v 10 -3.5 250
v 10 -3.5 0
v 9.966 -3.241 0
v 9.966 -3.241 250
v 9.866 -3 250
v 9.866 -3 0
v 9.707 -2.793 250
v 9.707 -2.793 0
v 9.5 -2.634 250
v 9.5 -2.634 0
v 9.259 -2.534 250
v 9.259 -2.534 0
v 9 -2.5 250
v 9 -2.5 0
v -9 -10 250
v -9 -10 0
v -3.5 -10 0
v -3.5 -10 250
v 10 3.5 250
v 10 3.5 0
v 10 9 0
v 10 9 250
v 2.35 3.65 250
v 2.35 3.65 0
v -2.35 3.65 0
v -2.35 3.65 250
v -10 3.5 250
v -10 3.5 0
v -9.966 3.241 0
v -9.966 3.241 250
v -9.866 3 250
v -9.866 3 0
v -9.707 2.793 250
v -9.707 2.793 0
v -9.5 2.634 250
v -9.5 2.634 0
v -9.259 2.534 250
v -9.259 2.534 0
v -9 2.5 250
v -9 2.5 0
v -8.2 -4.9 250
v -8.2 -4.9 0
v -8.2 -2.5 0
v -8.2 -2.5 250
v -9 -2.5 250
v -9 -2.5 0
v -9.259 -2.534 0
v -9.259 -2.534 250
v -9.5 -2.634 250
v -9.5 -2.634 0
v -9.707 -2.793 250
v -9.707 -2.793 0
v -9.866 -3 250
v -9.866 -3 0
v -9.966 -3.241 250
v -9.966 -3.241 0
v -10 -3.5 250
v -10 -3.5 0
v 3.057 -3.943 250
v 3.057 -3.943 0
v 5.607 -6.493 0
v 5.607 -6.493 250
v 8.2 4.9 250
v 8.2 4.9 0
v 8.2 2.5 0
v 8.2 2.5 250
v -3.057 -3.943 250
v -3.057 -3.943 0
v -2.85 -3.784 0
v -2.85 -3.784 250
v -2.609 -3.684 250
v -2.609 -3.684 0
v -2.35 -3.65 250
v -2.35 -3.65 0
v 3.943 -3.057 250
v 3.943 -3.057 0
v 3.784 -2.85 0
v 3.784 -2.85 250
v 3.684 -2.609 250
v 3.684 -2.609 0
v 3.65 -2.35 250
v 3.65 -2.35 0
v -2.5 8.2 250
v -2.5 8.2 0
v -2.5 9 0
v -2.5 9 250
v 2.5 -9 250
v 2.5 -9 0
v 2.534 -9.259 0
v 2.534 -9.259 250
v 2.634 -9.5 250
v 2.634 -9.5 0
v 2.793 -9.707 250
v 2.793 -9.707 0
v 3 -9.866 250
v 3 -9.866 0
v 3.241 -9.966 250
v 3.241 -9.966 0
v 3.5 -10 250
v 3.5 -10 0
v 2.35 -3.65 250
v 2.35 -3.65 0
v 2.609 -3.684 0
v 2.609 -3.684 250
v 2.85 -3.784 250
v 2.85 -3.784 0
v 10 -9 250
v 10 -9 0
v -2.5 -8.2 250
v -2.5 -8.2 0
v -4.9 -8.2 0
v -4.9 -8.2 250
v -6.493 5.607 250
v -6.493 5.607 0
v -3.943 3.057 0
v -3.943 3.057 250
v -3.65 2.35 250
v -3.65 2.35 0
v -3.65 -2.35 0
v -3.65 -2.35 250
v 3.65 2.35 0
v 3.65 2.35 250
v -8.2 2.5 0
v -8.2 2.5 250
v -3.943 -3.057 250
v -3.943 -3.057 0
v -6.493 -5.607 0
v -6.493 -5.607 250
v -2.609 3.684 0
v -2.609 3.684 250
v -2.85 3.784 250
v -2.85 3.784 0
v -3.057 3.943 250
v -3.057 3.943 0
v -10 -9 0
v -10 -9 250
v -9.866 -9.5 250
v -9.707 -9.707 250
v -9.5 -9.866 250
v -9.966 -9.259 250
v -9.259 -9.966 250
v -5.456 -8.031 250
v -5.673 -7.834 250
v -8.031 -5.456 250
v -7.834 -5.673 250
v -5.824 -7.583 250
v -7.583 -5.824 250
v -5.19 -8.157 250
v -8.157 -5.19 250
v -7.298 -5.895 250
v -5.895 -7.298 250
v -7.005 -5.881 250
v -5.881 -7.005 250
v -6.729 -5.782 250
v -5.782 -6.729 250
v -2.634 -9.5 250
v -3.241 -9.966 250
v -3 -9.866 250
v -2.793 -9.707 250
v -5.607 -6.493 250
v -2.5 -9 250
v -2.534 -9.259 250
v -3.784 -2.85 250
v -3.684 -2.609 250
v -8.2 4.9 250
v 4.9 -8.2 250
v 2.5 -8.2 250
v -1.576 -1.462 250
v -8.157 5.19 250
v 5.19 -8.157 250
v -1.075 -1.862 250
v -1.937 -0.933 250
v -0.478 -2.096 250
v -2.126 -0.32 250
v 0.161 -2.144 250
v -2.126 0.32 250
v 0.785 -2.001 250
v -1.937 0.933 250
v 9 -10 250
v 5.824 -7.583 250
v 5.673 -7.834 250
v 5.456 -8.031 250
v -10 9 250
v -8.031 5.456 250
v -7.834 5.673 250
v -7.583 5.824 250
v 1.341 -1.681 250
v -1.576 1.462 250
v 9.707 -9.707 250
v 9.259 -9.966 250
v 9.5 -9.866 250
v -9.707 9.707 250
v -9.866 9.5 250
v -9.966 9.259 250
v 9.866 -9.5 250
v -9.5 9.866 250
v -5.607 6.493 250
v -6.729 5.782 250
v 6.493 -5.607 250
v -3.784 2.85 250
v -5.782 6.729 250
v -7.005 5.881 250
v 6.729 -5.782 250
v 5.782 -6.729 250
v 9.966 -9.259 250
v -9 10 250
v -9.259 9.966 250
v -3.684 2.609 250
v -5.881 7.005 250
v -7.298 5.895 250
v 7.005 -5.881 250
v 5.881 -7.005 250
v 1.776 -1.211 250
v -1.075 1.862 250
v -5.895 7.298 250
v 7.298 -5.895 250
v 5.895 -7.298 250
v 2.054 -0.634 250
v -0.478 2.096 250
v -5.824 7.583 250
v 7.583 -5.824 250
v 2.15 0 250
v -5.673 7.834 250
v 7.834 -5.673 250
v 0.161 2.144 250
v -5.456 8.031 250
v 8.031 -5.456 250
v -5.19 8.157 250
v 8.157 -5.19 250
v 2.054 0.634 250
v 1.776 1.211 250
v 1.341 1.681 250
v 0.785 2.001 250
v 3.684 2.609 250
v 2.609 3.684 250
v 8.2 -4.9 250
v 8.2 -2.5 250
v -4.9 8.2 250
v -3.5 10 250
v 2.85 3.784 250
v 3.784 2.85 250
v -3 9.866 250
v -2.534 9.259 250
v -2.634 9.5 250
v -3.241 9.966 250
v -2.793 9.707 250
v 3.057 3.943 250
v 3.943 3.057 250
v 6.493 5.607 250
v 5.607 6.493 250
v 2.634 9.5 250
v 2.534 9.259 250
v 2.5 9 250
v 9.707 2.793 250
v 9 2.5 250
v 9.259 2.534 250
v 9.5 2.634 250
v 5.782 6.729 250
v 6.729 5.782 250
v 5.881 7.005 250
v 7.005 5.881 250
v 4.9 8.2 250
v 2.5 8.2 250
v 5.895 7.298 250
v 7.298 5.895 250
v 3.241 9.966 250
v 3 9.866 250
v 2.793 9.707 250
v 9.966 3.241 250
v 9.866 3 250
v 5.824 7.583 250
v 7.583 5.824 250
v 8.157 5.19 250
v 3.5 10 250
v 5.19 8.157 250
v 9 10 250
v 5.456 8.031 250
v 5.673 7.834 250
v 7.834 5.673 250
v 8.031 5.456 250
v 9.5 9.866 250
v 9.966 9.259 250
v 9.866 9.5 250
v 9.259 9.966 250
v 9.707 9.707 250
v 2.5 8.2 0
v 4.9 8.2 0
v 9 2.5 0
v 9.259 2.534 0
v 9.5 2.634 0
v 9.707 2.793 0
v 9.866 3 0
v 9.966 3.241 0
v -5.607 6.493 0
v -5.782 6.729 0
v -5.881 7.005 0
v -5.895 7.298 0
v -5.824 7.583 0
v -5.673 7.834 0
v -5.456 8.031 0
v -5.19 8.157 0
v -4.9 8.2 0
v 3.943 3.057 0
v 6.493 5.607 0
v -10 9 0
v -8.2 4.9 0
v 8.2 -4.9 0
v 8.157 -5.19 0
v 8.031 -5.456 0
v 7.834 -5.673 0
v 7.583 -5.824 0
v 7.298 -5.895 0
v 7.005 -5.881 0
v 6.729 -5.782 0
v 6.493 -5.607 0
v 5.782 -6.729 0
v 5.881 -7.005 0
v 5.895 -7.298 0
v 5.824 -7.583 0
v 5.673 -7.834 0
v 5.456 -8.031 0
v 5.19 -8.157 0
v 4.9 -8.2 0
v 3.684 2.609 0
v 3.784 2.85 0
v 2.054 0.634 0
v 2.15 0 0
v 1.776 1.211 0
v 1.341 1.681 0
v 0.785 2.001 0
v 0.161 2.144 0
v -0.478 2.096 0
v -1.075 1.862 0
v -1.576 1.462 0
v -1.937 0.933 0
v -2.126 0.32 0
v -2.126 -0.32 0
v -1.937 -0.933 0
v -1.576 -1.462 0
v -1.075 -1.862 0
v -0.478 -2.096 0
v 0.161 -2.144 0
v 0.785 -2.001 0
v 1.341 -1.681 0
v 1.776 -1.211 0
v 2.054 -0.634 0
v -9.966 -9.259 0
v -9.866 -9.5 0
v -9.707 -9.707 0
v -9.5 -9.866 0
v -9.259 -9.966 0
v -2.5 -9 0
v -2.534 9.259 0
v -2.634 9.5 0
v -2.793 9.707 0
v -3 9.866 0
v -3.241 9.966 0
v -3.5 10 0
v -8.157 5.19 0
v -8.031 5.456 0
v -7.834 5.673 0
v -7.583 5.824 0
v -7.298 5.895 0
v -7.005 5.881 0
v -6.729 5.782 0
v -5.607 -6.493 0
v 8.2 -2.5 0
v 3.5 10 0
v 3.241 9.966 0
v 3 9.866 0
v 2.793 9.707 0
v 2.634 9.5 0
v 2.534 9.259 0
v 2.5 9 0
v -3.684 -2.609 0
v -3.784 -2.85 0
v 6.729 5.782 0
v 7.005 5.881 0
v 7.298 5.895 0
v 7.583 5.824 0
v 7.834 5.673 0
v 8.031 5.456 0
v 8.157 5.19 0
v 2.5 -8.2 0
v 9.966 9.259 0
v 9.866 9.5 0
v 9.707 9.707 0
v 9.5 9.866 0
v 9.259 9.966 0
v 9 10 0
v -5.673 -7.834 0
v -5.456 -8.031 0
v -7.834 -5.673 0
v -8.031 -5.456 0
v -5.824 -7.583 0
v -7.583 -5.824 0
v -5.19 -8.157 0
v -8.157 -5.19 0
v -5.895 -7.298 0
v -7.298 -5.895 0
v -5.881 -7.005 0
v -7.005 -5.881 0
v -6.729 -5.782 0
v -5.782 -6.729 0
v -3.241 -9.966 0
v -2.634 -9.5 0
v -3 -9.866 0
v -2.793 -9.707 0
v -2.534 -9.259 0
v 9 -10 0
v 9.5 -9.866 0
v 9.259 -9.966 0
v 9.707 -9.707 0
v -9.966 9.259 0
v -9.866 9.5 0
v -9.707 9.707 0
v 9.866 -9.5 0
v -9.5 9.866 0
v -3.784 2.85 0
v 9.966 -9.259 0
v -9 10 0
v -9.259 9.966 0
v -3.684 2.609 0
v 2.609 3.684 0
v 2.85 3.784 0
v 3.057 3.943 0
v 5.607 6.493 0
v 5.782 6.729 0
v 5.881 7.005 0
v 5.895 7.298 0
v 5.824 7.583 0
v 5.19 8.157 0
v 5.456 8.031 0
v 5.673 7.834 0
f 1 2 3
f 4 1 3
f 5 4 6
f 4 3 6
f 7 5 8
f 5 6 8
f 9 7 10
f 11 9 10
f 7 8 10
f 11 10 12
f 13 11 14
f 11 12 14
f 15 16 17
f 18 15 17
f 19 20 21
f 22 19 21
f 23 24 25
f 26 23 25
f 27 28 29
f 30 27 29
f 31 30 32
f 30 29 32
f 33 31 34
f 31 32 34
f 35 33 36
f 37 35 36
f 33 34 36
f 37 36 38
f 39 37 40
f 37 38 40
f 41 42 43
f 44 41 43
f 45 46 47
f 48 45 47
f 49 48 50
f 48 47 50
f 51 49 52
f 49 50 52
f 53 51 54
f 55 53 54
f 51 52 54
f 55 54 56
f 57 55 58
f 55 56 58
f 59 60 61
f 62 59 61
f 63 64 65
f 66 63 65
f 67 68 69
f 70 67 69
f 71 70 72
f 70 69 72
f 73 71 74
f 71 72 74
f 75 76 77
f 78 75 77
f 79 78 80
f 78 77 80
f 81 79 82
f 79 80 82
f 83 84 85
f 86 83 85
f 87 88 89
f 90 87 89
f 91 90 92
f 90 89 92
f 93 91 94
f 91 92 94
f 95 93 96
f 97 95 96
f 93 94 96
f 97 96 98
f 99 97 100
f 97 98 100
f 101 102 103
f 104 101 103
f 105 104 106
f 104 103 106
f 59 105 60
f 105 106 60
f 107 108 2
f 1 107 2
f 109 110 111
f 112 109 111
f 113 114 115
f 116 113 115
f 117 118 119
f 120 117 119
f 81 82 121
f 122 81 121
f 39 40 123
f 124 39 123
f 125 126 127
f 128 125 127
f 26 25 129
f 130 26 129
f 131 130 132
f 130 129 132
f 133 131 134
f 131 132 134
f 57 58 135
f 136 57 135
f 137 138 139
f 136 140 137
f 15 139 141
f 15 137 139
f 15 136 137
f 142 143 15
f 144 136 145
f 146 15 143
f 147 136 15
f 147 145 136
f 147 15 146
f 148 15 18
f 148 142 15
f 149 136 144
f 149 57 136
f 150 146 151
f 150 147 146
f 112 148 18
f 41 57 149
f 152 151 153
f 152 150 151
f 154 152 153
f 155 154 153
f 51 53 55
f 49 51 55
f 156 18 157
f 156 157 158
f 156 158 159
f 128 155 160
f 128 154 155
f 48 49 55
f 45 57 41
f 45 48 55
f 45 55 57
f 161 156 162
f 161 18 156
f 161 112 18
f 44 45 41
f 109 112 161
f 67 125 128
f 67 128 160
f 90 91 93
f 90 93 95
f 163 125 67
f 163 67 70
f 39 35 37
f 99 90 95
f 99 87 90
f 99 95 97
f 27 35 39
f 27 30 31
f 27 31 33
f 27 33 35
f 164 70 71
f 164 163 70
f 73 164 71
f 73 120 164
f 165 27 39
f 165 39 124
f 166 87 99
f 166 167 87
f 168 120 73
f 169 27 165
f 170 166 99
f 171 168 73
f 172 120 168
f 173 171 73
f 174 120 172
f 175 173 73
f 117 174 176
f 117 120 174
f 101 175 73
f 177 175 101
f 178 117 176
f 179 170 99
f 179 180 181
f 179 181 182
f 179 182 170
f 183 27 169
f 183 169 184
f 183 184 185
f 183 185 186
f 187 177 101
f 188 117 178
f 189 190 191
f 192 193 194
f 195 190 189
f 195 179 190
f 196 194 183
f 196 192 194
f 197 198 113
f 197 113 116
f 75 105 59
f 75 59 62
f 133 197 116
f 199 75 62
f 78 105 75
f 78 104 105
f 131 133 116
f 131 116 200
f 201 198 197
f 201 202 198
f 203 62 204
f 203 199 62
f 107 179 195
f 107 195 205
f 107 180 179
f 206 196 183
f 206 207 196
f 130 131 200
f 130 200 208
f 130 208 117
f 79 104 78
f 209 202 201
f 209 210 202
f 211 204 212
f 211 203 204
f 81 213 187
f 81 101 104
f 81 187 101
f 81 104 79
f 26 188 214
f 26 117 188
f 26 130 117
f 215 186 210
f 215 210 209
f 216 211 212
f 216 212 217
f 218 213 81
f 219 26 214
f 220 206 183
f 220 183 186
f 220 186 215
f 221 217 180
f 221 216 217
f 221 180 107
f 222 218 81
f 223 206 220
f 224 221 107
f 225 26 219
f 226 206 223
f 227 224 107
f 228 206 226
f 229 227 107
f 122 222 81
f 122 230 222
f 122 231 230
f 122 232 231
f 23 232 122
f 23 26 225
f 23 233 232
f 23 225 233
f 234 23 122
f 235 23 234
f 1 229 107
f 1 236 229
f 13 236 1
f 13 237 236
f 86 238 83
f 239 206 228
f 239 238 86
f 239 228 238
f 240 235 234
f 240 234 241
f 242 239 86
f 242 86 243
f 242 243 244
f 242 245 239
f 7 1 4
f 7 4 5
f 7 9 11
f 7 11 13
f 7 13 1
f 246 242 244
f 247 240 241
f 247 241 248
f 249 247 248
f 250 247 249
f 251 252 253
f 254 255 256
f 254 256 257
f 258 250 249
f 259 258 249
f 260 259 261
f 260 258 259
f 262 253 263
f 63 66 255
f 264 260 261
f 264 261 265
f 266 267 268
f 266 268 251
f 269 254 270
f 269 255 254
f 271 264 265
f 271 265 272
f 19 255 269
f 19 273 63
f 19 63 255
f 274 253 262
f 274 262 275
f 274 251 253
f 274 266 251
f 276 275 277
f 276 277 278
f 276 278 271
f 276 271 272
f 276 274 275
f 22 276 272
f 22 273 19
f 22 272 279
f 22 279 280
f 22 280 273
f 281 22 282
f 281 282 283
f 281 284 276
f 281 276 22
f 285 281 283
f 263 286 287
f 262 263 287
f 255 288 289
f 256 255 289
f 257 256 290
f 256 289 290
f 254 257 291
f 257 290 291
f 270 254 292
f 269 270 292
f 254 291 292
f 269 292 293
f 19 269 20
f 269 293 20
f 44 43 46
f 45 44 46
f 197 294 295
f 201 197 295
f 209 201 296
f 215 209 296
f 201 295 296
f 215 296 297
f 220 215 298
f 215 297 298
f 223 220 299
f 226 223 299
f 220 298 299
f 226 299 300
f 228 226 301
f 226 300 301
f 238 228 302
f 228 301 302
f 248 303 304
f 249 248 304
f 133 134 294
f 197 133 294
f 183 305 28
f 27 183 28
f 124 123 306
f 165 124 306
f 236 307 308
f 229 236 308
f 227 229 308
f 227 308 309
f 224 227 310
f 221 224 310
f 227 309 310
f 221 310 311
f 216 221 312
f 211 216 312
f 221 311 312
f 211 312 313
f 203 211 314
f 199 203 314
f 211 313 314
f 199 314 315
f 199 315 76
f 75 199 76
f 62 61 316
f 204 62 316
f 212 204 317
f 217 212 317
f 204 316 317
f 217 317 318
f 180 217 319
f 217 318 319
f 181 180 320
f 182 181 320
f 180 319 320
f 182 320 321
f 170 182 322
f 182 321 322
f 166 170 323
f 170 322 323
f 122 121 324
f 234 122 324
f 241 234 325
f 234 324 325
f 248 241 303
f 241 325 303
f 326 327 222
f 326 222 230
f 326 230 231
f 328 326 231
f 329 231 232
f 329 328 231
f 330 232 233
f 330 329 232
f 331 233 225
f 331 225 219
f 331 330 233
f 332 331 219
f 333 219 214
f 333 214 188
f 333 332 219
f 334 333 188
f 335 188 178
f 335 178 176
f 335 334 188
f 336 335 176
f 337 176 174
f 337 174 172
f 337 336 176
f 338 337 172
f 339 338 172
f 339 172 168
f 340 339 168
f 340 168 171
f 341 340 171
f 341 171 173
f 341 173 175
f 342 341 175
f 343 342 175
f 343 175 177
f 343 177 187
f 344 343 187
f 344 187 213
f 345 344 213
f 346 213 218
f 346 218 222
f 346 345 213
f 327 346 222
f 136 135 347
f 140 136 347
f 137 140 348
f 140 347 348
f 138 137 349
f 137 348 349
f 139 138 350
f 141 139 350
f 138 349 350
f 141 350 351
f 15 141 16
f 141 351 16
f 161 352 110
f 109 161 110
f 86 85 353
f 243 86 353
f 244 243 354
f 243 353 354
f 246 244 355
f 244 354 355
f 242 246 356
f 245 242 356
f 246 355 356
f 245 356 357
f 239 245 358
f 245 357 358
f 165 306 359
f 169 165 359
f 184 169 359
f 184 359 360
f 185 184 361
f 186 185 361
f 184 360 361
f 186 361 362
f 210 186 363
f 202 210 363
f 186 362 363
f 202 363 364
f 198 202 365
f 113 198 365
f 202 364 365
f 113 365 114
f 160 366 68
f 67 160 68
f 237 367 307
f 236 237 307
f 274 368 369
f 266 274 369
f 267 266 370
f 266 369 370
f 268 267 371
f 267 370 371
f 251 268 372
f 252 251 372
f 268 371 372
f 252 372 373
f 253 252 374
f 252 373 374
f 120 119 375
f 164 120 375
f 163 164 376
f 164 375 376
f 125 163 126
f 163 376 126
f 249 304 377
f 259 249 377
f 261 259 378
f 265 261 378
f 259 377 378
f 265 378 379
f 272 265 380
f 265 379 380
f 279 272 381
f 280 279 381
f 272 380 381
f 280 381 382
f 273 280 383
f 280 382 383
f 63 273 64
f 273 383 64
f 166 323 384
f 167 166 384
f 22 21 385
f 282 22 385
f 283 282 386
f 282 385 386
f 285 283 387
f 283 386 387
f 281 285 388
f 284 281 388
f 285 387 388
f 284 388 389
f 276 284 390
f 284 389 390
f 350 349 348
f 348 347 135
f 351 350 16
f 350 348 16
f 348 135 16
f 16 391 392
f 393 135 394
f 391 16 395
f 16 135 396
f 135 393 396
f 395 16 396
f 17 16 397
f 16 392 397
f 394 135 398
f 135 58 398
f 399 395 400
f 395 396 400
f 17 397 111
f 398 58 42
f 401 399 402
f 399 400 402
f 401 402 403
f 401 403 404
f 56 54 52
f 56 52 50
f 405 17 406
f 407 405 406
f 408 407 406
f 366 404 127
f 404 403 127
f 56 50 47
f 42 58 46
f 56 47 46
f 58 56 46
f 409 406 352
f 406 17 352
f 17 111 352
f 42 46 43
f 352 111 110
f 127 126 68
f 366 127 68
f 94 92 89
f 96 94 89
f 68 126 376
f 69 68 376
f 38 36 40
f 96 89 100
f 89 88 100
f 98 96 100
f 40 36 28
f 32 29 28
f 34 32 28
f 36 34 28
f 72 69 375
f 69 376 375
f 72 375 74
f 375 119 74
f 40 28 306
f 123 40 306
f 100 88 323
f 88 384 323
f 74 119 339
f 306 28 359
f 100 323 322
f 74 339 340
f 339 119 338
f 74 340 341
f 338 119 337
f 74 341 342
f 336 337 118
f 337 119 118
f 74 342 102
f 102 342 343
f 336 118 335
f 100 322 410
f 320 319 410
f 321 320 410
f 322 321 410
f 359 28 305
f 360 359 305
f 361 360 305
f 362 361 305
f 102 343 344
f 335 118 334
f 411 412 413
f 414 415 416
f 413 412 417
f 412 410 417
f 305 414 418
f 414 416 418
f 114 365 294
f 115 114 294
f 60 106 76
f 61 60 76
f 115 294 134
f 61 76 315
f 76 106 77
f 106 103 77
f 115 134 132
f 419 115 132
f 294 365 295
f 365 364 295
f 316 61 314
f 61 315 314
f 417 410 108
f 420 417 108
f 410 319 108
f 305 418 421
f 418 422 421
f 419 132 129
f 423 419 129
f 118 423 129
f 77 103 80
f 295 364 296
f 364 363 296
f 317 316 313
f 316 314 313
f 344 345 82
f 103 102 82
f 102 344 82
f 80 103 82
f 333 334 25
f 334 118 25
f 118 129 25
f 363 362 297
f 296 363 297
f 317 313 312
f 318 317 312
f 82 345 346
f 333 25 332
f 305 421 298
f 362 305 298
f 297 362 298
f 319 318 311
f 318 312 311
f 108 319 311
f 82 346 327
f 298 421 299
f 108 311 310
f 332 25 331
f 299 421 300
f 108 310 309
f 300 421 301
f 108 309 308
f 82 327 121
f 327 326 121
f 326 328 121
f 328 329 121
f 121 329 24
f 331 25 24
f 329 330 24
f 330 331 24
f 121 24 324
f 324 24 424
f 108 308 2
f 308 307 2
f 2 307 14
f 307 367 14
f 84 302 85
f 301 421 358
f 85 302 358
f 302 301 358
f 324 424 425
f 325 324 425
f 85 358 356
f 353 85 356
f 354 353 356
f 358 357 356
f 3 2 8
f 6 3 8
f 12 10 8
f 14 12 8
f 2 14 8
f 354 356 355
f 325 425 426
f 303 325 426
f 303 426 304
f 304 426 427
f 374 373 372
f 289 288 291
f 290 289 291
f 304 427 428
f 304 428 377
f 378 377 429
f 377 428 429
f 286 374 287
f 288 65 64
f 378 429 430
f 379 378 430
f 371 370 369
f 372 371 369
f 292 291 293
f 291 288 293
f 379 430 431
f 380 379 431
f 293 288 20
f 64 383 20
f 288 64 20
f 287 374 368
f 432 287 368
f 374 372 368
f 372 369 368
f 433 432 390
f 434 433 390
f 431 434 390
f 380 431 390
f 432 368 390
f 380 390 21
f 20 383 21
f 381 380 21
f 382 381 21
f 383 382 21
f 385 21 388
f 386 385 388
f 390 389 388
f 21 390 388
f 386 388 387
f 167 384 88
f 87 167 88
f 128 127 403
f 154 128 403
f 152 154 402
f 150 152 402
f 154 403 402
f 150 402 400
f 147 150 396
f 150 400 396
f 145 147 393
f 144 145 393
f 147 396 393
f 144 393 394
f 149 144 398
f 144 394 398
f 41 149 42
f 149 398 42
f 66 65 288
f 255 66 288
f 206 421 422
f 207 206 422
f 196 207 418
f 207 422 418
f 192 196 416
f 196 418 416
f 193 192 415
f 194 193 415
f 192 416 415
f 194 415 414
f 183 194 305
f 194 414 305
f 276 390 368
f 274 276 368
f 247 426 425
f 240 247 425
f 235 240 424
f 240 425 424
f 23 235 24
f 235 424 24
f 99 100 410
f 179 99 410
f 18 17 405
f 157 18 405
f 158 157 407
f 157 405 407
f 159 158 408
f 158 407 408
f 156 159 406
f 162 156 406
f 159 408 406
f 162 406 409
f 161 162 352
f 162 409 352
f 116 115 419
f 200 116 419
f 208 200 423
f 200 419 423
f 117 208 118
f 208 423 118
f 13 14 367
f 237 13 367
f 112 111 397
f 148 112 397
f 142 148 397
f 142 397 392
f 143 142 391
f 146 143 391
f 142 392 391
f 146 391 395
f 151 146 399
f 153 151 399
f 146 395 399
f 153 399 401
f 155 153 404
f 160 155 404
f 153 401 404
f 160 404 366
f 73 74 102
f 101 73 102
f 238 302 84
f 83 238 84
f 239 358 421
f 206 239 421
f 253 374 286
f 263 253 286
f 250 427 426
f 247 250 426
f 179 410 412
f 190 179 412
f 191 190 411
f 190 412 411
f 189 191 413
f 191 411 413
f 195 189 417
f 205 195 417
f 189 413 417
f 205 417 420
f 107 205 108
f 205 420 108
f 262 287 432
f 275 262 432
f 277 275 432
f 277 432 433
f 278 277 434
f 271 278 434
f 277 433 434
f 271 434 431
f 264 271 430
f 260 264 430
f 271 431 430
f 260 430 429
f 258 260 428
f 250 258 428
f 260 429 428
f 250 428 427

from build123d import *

# Parameters (mm, degrees)
F0_R     = 2.15
F1_DEPTH = 250


# Not quite as in the source:
# - ends of sketch curves that miss each other by under 0.0002 mm in the source are joined


with BuildPart() as f1:
    # F0 (on Top) → F1 (new body)
    with BuildSketch(Plane.XY):
        with BuildLine():
            Line((10, 3.5), (10, 9))
            ThreePointArc((10, 9), (9.7071067812, 9.7071067812), (9, 10))
            Line((9, 10), (3.5, 10))
            ThreePointArc((3.5, 10), (2.7928932188, 9.7071067812), (2.5, 9))
            Line((2.5, 9), (2.5, 8.2))
            Line((2.5, 8.2), (4.9, 8.2))
            ThreePointArc((4.9, 8.2), (5.8238795325, 7.5826834324), (5.6071067812, 6.4928932188))
            Line((5.6071067812, 6.4928932188), (3.057107, 3.942893))
            ThreePointArc((3.057107, 3.942893), (2.7326834324, 3.7261204675), (2.35, 3.65))
            Line((2.35, 3.65), (-2.35, 3.65))
            ThreePointArc((-2.35, 3.65), (-2.7326834324, 3.7261204675), (-3.0571067812, 3.9428932188))
            Line((-3.0571067812, 3.9428932188), (-5.607107, 6.492893))
            ThreePointArc((-5.607107, 6.492893), (-5.8238795325, 7.5826834324), (-4.9, 8.2))
            Line((-4.9, 8.2), (-2.5, 8.2))
            Line((-2.5, 8.2), (-2.5, 9))
            ThreePointArc((-2.5, 9), (-2.7928932188, 9.7071067812), (-3.5, 10))
            Line((-3.5, 10), (-9, 10))
            ThreePointArc((-9, 10), (-9.7071067812, 9.7071067812), (-10, 9))
            Line((-10, 9), (-10, 3.5))
            ThreePointArc((-10, 3.5), (-9.7071067812, 2.7928932188), (-9, 2.5))
            Line((-9, 2.5), (-8.2, 2.5))
            Line((-8.2, 2.5), (-8.2, 4.9))
            ThreePointArc((-8.2, 4.9), (-7.5826834324, 5.8238795325), (-6.4928932188, 5.6071067812))
            Line((-6.4928932188, 5.6071067812), (-3.942893, 3.057107))
            ThreePointArc((-3.942893, 3.057107), (-3.7261204675, 2.7326834324), (-3.65, 2.35))
            Line((-3.65, 2.35), (-3.65, -2.35))
            ThreePointArc((-3.65, -2.35), (-3.7261204675, -2.7326834324), (-3.9428932188, -3.0571067812))
            Line((-3.9428932188, -3.0571067812), (-6.492893, -5.607107))
            ThreePointArc((-6.492893, -5.607107), (-7.5826834324, -5.8238795325), (-8.2, -4.9))
            Line((-8.2, -4.9), (-8.2, -2.5))
            Line((-8.2, -2.5), (-9, -2.5))
            ThreePointArc((-9, -2.5), (-9.7071067812, -2.7928932188), (-10, -3.5))
            Line((-10, -3.5), (-10, -9))
            ThreePointArc((-10, -9), (-9.7071067812, -9.7071067812), (-9, -10))
            Line((-9, -10), (-3.5, -10))
            ThreePointArc((-3.5, -10), (-2.7928932188, -9.7071067812), (-2.5, -9))
            Line((-2.5, -9), (-2.5, -8.2))
            Line((-2.5, -8.2), (-4.9, -8.2))
            ThreePointArc((-4.9, -8.2), (-5.8238795325, -7.5826834324), (-5.6071067812, -6.4928932188))
            Line((-5.6071067812, -6.4928932188), (-3.057107, -3.942893))
            ThreePointArc((-3.057107, -3.942893), (-2.7326834324, -3.7261204675), (-2.35, -3.65))
            Line((-2.35, -3.65), (2.35, -3.65))
            ThreePointArc((2.35, -3.65), (2.7326834324, -3.7261204675), (3.0571067812, -3.9428932188))
            Line((3.0571067812, -3.9428932188), (5.607107, -6.492893))
            ThreePointArc((5.607107, -6.492893), (5.8238795325, -7.5826834324), (4.9, -8.2))
            Line((4.9, -8.2), (2.5, -8.2))
            Line((2.5, -8.2), (2.5, -9))
            ThreePointArc((2.5, -9), (2.7928932188, -9.7071067812), (3.5, -10))
            Line((3.5, -10), (9, -10))
            ThreePointArc((9, -10), (9.7071067812, -9.7071067812), (10, -9))
            Line((10, -9), (10, -3.5))
            ThreePointArc((10, -3.5), (9.7071067812, -2.7928932188), (9, -2.5))
            Line((9, -2.5), (8.2, -2.5))
            Line((8.2, -2.5), (8.2, -4.9))
            ThreePointArc((8.2, -4.9), (7.5826834324, -5.8238795325), (6.4928932188, -5.6071067812))
            Line((6.4928932188, -5.6071067812), (3.942893, -3.057107))
            ThreePointArc((3.942893, -3.057107), (3.7261204675, -2.7326834324), (3.65, -2.35))
            Line((3.65, -2.35), (3.65, 2.35))
            ThreePointArc((3.65, 2.35), (3.7261204675, 2.7326834324), (3.9428932188, 3.0571067812))
            Line((3.9428932188, 3.0571067812), (6.492893, 5.607107))
            ThreePointArc((6.492893, 5.607107), (7.5826834324, 5.8238795325), (8.2, 4.9))
            Line((8.2, 4.9), (8.2, 2.5))
            Line((8.2, 2.5), (9, 2.5))
            ThreePointArc((9, 2.5), (9.7071067812, 2.7928932188), (10, 3.5))
        make_face()
        Circle(F0_R, mode=Mode.SUBTRACT)
    extrude(amount=F1_DEPTH)


solid = f1.part
